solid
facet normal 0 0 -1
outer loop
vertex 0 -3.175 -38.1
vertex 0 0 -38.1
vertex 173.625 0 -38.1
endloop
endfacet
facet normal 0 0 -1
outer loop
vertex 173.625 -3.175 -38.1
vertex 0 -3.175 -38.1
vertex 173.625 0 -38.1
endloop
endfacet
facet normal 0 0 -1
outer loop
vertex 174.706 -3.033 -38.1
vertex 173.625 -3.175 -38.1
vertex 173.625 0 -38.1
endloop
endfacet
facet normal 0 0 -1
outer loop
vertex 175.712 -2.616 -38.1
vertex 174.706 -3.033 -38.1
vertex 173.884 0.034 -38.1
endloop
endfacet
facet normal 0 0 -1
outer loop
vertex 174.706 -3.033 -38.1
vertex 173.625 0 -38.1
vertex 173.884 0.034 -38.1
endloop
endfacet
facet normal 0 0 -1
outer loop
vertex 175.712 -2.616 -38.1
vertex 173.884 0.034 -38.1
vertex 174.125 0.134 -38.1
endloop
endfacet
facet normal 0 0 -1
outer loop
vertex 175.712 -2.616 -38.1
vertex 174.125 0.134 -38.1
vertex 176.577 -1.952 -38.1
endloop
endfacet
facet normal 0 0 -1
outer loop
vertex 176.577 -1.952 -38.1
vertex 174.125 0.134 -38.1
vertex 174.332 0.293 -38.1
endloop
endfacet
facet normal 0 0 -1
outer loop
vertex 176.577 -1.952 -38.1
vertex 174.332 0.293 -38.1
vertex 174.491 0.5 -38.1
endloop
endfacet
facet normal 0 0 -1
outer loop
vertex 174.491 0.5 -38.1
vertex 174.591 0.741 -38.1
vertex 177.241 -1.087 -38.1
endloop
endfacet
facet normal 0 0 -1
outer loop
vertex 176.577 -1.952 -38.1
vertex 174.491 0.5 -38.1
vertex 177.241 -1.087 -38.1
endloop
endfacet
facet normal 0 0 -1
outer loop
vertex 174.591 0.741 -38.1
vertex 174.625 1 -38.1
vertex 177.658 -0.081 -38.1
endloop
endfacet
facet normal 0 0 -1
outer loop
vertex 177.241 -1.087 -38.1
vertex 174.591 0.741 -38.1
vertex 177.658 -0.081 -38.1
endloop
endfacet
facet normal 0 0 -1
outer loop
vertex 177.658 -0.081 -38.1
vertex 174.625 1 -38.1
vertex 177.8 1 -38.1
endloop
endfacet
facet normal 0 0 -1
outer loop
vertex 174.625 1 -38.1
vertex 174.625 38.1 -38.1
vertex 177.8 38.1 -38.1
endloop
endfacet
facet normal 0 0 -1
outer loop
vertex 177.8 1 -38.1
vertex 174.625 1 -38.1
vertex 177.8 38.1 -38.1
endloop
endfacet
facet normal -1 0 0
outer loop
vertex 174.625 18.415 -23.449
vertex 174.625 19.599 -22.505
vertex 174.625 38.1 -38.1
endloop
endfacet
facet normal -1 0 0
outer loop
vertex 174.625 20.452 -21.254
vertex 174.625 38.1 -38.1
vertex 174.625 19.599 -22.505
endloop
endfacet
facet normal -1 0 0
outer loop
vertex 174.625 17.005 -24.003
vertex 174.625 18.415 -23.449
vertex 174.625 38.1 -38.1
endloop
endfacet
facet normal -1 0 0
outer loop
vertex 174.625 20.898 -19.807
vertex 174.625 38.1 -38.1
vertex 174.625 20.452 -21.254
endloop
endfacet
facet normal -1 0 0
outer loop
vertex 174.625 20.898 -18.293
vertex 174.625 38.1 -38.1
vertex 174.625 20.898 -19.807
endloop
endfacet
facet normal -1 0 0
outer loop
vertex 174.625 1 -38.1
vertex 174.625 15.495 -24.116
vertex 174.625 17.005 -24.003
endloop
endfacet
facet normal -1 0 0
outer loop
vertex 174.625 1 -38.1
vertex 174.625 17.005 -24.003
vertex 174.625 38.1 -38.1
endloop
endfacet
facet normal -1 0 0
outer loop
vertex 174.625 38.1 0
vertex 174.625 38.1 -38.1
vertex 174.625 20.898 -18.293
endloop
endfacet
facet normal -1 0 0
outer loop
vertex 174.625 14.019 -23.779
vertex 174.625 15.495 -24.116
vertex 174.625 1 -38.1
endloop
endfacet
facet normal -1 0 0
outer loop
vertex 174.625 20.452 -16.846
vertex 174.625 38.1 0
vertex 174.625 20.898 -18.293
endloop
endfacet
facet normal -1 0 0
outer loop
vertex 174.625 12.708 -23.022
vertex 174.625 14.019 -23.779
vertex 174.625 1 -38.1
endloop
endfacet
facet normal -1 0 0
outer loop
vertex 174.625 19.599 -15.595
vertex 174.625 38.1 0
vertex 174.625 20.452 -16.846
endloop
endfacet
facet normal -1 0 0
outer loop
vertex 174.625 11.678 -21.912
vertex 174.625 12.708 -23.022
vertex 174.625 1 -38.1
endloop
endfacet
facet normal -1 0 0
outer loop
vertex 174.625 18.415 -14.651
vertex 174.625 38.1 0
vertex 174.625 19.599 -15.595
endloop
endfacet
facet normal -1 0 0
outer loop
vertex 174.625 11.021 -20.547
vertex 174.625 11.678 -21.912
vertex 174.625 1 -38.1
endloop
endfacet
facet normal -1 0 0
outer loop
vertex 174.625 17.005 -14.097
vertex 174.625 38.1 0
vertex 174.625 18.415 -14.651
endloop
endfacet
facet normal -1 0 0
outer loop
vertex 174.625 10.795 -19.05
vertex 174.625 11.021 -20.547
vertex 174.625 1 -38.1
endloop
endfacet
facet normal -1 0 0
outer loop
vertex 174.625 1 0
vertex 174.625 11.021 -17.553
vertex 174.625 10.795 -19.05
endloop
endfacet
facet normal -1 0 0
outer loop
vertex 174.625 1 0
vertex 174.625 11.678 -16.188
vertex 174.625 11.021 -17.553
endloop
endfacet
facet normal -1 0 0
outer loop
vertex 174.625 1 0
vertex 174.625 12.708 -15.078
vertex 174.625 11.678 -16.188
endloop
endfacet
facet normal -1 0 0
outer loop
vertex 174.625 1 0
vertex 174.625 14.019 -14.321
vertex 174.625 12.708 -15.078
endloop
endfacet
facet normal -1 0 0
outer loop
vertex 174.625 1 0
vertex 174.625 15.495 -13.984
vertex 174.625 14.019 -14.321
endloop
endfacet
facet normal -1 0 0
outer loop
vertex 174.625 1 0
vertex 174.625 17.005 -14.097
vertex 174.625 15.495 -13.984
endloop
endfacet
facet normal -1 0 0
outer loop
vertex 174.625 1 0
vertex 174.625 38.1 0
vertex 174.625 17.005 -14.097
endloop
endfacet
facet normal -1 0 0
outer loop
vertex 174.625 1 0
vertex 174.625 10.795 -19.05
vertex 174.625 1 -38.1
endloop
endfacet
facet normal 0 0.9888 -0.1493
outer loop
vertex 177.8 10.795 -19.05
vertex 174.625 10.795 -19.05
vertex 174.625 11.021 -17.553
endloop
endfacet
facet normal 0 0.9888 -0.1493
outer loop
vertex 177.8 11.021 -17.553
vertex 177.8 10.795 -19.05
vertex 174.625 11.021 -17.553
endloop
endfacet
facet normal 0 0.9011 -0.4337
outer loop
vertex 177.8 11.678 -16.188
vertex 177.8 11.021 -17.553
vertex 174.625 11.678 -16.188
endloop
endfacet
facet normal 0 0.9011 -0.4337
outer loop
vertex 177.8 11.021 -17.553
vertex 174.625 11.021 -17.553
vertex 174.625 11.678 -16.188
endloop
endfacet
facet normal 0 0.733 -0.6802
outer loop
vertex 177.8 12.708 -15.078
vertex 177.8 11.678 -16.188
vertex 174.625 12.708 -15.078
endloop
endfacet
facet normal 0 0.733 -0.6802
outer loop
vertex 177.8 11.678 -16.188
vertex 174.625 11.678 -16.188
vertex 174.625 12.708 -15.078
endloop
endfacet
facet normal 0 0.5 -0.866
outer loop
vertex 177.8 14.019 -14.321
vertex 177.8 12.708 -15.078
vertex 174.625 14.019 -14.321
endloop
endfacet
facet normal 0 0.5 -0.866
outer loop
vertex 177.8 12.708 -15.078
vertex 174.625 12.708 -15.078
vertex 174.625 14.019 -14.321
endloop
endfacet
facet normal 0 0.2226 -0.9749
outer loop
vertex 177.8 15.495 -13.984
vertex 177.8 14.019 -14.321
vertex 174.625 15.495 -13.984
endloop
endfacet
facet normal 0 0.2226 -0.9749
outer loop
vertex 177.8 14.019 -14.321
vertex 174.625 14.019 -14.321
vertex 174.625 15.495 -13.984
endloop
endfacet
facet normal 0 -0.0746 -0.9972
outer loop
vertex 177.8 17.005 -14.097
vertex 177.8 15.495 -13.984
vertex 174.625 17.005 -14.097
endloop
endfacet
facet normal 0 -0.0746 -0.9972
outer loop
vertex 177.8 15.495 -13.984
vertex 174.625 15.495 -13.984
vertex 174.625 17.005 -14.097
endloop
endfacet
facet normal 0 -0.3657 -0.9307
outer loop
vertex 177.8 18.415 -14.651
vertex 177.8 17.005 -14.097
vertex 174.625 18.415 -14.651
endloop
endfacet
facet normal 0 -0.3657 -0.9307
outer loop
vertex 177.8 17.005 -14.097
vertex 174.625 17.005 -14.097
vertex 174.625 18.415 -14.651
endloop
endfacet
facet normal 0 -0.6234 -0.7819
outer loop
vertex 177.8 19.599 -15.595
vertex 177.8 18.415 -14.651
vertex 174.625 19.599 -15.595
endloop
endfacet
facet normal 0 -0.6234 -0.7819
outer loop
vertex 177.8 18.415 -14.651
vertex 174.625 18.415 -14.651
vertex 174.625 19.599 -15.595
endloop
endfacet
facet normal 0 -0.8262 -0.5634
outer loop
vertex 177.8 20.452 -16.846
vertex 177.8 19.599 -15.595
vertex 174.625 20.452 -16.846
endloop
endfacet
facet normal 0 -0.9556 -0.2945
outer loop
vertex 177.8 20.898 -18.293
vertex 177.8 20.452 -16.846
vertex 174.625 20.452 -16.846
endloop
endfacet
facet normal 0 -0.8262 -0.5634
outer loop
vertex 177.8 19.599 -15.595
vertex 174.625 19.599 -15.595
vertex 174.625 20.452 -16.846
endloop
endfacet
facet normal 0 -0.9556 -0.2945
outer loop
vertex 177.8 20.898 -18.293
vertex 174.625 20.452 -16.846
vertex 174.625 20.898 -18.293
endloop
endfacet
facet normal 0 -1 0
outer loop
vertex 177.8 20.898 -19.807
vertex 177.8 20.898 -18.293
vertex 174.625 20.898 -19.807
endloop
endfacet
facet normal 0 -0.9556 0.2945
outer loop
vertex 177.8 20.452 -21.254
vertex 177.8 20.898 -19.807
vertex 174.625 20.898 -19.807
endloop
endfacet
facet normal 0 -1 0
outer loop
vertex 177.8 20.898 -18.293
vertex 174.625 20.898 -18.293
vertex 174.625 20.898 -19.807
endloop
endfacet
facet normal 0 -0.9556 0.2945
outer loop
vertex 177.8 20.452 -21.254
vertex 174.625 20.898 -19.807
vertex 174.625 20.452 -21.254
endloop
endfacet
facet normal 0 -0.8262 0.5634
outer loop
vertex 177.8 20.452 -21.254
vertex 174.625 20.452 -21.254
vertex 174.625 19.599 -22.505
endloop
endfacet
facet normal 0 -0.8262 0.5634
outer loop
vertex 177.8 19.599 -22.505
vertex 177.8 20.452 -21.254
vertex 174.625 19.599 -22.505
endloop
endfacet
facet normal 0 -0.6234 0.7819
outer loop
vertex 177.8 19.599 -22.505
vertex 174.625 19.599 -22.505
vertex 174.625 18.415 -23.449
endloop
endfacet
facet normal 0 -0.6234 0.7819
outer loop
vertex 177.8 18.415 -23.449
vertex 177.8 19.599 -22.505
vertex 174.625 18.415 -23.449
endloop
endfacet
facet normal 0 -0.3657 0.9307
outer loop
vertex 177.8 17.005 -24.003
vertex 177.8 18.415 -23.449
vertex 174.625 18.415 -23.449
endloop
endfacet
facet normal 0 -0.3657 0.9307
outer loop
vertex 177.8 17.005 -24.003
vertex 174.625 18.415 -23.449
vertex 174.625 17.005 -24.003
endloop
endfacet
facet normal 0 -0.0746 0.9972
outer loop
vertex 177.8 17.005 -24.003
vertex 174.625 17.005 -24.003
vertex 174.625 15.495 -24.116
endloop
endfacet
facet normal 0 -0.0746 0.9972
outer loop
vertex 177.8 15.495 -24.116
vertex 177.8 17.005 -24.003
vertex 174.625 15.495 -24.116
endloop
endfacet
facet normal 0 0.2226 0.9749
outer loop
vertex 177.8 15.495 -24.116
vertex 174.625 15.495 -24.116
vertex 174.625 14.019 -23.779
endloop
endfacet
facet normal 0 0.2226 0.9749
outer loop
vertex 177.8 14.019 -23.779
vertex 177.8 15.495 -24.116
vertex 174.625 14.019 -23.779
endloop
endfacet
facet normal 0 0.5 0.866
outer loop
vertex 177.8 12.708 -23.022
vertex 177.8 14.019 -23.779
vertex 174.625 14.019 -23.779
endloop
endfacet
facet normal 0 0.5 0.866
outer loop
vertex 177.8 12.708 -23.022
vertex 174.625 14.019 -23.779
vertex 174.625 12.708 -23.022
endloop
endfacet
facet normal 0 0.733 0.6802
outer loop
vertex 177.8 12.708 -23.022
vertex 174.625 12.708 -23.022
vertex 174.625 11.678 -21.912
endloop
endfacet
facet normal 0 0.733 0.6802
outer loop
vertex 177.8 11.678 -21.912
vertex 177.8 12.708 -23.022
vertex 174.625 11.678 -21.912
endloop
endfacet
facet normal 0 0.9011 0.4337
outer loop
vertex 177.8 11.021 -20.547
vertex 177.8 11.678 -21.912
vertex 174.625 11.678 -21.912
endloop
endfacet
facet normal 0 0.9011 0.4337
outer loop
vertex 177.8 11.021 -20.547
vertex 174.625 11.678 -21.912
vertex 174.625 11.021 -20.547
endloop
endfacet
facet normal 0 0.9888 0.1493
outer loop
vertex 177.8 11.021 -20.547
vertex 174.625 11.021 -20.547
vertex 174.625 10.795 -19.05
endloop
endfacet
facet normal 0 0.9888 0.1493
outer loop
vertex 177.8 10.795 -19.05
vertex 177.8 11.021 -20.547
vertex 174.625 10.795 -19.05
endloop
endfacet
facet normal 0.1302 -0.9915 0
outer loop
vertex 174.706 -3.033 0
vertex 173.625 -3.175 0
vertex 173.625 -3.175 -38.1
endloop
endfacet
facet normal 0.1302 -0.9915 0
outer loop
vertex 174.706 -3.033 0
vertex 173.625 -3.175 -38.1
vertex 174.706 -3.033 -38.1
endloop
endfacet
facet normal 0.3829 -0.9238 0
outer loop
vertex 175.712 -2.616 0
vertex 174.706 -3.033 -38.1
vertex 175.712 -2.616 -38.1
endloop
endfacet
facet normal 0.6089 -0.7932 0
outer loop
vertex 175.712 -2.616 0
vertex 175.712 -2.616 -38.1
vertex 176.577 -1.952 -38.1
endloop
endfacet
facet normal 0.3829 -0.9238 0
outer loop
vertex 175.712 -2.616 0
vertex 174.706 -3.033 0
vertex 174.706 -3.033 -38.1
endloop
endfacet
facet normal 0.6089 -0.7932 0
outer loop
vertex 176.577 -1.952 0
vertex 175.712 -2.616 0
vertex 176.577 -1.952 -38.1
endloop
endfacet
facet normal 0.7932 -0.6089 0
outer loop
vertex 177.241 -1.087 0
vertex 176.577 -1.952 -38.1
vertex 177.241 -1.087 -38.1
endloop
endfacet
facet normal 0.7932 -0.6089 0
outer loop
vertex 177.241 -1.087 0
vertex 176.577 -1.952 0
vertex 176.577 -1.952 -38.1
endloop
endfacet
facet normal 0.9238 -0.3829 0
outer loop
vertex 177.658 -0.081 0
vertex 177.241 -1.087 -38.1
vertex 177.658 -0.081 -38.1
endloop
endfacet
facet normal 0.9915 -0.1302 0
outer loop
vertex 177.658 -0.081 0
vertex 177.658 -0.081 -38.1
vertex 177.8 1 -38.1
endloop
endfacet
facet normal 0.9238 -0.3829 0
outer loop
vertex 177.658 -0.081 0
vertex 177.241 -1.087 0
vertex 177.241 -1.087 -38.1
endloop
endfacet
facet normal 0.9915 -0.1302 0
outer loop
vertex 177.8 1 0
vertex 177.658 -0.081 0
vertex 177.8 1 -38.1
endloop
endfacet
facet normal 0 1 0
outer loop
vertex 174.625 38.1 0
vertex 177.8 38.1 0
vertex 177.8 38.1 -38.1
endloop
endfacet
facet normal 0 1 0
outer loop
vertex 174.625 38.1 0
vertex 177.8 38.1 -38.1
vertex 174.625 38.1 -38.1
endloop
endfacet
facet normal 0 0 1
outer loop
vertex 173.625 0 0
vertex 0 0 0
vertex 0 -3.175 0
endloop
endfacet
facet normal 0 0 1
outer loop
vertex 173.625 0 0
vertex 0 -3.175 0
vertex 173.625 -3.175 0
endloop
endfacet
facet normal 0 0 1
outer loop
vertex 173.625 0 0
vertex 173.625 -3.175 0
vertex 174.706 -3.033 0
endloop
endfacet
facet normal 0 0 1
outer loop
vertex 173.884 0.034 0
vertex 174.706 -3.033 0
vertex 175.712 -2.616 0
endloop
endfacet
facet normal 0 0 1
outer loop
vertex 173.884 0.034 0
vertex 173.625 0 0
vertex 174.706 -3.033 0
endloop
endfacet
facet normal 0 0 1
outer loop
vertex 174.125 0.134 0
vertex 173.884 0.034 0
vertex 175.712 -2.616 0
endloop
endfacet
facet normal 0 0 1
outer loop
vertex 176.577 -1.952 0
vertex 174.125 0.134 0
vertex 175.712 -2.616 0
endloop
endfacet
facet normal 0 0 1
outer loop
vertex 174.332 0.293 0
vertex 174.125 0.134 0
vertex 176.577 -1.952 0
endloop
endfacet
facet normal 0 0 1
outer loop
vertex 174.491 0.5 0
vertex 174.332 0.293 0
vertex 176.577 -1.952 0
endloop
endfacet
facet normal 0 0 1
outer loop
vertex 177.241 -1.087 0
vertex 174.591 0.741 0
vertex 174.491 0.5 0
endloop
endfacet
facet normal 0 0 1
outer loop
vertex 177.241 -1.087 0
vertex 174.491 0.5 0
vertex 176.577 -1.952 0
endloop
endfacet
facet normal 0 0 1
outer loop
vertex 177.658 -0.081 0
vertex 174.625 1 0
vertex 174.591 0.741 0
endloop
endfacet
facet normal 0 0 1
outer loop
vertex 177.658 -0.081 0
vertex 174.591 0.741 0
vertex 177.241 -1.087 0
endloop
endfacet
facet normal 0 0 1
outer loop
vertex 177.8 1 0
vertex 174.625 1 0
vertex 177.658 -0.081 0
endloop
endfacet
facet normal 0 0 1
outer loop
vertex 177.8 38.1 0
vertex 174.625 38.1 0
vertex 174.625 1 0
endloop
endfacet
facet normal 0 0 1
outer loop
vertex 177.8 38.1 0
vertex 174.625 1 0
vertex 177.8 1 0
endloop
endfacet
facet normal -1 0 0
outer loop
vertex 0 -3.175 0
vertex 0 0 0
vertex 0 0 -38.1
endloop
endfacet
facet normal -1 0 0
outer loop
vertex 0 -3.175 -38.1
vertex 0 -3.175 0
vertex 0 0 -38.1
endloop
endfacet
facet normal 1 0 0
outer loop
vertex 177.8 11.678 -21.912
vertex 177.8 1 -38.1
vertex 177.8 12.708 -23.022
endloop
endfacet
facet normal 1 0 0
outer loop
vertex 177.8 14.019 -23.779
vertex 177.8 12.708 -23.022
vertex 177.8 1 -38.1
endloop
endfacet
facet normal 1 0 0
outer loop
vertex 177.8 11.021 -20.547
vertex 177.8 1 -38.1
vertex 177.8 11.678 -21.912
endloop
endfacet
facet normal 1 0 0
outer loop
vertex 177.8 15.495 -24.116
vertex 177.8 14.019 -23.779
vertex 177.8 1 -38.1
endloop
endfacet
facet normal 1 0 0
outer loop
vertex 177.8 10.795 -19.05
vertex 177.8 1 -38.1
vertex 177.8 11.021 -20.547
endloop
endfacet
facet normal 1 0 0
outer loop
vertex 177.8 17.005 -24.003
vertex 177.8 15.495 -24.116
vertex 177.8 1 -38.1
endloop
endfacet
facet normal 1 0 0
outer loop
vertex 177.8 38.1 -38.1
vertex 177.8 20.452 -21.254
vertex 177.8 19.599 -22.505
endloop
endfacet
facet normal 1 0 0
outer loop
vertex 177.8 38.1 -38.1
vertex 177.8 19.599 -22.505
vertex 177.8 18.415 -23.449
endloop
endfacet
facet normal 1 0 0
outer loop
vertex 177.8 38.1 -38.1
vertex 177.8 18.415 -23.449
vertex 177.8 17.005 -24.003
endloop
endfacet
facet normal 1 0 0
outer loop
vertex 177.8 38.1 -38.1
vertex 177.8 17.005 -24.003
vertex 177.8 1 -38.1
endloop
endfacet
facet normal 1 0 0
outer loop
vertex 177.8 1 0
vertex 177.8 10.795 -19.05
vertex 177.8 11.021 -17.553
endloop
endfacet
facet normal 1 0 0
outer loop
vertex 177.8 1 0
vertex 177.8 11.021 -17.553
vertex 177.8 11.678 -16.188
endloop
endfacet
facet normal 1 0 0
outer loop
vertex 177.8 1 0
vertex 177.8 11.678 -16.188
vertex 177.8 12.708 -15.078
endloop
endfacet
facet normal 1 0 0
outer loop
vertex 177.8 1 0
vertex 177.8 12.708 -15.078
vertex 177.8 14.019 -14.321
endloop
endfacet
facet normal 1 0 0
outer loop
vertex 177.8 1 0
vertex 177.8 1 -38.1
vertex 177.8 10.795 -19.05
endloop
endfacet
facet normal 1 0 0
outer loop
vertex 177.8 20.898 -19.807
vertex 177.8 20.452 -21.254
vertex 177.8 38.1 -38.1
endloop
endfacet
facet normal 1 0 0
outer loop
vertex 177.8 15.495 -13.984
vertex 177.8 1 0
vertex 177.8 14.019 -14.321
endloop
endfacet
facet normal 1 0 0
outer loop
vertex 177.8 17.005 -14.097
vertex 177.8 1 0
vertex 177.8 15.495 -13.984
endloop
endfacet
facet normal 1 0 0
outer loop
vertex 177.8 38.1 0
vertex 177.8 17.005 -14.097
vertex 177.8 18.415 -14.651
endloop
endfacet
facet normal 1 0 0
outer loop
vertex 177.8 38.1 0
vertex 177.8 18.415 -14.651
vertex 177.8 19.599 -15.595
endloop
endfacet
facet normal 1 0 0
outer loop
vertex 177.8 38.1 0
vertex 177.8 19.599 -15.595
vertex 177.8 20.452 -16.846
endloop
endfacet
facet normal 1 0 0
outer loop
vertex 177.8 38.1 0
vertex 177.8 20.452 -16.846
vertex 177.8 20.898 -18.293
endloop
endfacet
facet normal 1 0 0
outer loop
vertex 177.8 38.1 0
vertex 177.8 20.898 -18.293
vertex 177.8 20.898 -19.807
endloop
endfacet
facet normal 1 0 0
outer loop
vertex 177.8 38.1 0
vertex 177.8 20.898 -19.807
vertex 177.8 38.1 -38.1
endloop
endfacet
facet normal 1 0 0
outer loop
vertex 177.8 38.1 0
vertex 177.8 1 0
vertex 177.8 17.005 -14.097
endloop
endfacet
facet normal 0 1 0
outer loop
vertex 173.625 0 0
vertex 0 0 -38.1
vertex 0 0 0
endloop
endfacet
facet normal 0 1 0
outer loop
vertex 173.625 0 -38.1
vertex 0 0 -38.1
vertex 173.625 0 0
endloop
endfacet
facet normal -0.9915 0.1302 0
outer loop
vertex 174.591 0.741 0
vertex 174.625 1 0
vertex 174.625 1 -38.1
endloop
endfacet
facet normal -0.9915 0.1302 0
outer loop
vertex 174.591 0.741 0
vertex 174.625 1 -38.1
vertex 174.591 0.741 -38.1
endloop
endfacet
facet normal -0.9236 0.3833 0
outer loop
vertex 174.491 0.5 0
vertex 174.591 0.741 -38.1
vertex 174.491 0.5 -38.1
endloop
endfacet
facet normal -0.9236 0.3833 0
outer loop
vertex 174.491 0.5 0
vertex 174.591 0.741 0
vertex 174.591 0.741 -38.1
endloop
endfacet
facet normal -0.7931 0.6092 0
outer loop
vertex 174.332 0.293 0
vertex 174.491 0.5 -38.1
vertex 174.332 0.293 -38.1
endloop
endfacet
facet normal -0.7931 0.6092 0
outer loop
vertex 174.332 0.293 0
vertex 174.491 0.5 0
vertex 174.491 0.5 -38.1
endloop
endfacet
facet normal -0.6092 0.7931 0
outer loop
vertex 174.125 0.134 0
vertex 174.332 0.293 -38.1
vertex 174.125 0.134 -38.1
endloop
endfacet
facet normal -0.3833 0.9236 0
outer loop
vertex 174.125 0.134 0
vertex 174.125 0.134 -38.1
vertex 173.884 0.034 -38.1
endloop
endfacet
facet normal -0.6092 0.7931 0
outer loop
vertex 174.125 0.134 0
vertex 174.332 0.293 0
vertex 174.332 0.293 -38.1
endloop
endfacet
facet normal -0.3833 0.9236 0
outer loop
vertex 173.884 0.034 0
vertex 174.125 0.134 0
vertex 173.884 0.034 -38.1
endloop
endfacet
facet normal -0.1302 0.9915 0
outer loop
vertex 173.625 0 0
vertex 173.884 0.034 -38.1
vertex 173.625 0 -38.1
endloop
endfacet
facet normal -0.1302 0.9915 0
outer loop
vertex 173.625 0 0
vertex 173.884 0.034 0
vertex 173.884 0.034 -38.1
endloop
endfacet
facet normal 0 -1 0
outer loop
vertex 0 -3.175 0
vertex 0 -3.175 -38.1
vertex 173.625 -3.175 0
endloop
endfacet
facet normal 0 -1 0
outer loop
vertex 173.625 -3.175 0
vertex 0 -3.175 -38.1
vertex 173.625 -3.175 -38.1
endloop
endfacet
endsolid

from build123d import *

# Parameters (mm, degrees)
SKETCH2_W                    = 177.8
SKETCH2_H                    = 38.1
BASE_FLANGE1_DEPTH           = 3.175
EDGE_FLANGE1_STRIP_W         = 14.7
EDGE_FLANGE1_STRIP_H         = 3.175
EDGE_FLANGE1_STRIP_CUT_DEPTH = 38.1
EDGE_FLANGE1_DEPTH           = 38.1
CUT_EXTRUDE1_REACH           = 184.749
SKETCH10_R                   = 5.08


# Sheet-metal steps are written as plain solids
with BuildPart() as part:
    # Sketch2 → Base-Flange1 (new body)
    with BuildSketch(Plane(origin=(0, 0, 0), x_dir=(1, 0, 0), z_dir=(0, 1, 0))):
        with Locations((88.9, 19.05)):
            Rectangle(SKETCH2_W, SKETCH2_H)
    extrude(amount=-BASE_FLANGE1_DEPTH)

    # Edge-Flange1 strip (across the edge) → Edge-Flange1 strip cut (cut)
    with BuildSketch(Plane(origin=(177.8, 0, 0), x_dir=(-1, 0, 0), z_dir=(0, 0, -1))):
        with Locations((-3.175, -1.5875)):
            Rectangle(EDGE_FLANGE1_STRIP_W, EDGE_FLANGE1_STRIP_H)
    extrude(amount=EDGE_FLANGE1_STRIP_CUT_DEPTH, mode=Mode.SUBTRACT)

    # Edge-Flange1 section (across the edge) → Edge-Flange1 (add)
    with BuildSketch(Plane(origin=(177.8, 0, 0), x_dir=(-1, 0, 0), z_dir=(0, 0, -1))):
        with BuildLine():
            Line((0, 1), (0, 38.1))
            Line((0, 38.1), (3.175, 38.1))
            Line((3.175, 38.1), (3.175, 1))
            ThreePointArc((3.175, 1), (3.467893219, 0.292893219), (4.175, 0))
            Line((4.175, 0), (4.175, -3.175))
            ThreePointArc((4.175, -3.175), (1.222829189, -1.952170811), (0, 1))
        make_face()
    extrude(amount=EDGE_FLANGE1_DEPTH)

    # Sketch10 → Cut-Extrude1 (cut, up to next)
    with BuildSketch(Plane.ZY.offset(-174.625), mode=Mode.PRIVATE) as cut_extrude1_sk1:
        with Locations(Location((-19.05, 15.875, 0), (0, 0, 270))):
            Circle(SKETCH10_R)
    cut_extrude1_tool1 = extrude(cut_extrude1_sk1.sketch, amount=-CUT_EXTRUDE1_REACH, mode=Mode.PRIVATE) & part.part
    add(cut_extrude1_tool1.solids().sort_by_distance((174.625, 15.875, -19.05))[0], mode=Mode.SUBTRACT)


solid = part.part
